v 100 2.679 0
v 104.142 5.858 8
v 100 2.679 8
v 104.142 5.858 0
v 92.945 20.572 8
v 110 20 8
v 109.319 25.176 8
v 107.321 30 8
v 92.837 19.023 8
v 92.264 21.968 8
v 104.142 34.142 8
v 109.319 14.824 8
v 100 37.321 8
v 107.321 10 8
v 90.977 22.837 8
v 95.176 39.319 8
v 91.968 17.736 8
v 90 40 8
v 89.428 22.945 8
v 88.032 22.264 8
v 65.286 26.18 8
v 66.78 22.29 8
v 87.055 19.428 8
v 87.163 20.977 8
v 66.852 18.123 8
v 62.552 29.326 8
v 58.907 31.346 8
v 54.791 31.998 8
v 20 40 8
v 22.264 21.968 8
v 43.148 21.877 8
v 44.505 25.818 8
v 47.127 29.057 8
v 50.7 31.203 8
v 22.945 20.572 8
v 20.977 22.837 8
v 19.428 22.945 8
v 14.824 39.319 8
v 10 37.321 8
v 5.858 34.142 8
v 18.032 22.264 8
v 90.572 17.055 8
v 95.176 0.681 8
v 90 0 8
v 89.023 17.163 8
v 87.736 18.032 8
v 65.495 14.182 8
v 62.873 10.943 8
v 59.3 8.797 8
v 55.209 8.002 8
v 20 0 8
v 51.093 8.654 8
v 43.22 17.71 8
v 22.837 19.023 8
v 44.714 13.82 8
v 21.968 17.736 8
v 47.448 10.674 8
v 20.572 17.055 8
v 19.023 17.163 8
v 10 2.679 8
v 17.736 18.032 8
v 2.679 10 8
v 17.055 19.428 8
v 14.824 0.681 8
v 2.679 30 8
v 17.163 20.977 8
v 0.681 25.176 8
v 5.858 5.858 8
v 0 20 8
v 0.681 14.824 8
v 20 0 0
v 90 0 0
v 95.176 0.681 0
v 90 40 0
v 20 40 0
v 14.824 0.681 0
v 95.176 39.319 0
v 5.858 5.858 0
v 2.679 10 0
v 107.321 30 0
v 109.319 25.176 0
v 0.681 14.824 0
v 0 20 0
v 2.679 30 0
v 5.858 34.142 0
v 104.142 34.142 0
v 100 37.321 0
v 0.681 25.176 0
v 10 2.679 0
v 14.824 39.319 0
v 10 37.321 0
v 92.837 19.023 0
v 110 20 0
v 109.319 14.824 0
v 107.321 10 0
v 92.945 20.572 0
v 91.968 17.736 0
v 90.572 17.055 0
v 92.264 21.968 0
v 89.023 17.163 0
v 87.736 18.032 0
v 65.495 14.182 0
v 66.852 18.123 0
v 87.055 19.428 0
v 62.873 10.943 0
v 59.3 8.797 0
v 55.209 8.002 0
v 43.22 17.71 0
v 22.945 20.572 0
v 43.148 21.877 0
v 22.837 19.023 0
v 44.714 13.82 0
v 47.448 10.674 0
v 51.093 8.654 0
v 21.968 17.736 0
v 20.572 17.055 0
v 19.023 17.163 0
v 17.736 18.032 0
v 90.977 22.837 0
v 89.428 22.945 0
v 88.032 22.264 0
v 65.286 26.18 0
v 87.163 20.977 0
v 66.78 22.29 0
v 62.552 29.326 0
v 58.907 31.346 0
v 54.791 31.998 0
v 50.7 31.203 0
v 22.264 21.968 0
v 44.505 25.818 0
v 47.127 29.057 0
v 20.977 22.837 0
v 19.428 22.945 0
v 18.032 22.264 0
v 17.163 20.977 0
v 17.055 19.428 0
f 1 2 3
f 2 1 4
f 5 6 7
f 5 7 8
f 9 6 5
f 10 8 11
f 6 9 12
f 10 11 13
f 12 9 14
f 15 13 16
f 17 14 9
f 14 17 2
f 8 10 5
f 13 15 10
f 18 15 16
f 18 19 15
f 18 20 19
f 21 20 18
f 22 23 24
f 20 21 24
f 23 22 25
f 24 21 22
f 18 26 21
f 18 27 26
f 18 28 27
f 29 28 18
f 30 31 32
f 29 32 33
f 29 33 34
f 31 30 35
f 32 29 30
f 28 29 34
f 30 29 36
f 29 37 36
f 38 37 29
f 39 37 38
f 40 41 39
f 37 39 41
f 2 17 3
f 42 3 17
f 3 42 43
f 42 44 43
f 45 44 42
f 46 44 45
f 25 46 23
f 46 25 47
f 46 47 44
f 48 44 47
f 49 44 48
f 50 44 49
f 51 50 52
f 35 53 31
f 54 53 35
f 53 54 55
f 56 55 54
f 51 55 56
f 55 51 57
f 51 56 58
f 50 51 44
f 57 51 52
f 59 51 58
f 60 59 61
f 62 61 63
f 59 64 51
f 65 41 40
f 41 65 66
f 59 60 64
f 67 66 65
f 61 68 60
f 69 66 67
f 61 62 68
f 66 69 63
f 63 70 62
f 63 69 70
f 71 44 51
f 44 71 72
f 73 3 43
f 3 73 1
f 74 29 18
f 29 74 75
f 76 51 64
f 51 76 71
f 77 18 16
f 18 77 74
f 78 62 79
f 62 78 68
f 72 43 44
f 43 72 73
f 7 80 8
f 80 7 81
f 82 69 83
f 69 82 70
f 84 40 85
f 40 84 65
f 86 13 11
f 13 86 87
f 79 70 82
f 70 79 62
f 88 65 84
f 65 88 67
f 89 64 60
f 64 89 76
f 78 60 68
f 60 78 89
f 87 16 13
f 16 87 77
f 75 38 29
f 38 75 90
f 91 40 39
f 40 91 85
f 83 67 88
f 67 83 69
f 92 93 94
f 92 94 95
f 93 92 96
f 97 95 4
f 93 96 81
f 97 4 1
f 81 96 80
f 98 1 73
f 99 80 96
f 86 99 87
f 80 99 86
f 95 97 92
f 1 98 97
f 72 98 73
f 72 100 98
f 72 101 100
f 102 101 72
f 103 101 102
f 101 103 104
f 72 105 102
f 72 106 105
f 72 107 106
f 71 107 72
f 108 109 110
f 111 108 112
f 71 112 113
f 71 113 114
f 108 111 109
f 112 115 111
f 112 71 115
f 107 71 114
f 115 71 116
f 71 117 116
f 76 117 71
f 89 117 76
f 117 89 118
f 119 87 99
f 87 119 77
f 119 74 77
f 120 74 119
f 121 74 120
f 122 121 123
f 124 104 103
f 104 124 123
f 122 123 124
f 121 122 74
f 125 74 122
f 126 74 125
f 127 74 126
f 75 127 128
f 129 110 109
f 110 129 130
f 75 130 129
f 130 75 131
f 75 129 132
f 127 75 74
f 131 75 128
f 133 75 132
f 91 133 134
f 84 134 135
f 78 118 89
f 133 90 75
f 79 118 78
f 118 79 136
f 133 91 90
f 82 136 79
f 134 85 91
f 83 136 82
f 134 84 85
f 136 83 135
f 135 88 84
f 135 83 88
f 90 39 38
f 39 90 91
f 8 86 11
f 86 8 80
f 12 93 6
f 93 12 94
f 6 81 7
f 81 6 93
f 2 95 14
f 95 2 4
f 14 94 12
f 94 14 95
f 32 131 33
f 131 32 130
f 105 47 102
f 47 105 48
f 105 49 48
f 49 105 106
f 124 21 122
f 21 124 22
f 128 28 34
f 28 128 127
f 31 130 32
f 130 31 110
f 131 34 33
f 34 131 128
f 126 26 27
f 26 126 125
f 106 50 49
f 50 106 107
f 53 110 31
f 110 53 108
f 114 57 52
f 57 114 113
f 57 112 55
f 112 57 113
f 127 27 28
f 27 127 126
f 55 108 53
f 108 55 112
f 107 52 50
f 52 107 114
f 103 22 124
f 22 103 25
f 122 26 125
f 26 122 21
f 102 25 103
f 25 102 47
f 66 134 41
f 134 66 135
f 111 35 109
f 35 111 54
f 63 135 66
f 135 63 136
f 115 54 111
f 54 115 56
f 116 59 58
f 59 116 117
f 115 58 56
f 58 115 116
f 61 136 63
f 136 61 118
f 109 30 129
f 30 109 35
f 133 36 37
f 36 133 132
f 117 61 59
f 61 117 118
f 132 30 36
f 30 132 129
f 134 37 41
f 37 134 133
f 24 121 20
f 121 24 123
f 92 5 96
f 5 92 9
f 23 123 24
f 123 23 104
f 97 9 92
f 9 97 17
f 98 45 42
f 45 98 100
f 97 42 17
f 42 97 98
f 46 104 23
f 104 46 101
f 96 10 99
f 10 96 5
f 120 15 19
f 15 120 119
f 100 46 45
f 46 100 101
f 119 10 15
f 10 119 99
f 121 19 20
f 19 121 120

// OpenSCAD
$fn = 32;

// ----------------------------------------------------------------------
// Spacer plate: obround span 70, caps R20
// ----------------------------------------------------------------------

// --- parameters (mm) ---
bore_r = 12;              // centre bore radius
bolt_r = 3;               // bolt hole radius
plate_t = 8;              // plate thickness, Z (extrusion height)
span = 70;                // obround span
cap_r = 20;               // cap radius

profile = [[20, 40], [14.824, 39.319], [10, 37.321], [5.858, 34.142], [2.679, 30], [0.681, 25.176], [0, 20], [0.681, 14.824], [2.679, 10], [5.858, 5.858], [10, 2.679], [14.824, 0.681], [20, 0], [90, 0], [95.176, 0.681], [100, 2.679], [104.142, 5.858], [107.321, 10], [109.319, 14.824], [110, 20], [109.319, 25.176], [107.321, 30], [104.142, 34.142], [100, 37.321], [95.176, 39.319], [90, 40]];  // primary outline, 26 points, counter clockwise
void_1 = [[66.78, 22.29], [65.286, 26.18], [62.552, 29.326], [58.907, 31.346], [54.791, 31.998], [50.7, 31.203], [47.127, 29.057], [44.505, 25.818], [43.148, 21.877], [43.22, 17.71], [44.714, 13.82], [47.448, 10.674], [51.093, 8.654], [55.209, 8.002], [59.3, 8.797], [62.873, 10.943], [65.495, 14.182], [66.852, 18.123]];  // centre bore, 18 points
void_2 = [[22.945, 20.572], [22.264, 21.968], [20.977, 22.837], [19.428, 22.945], [18.032, 22.264], [17.163, 20.977], [17.055, 19.428], [17.736, 18.032], [19.023, 17.163], [20.572, 17.055], [21.968, 17.736], [22.837, 19.023]];  // end hole, 12 points
void_3 = [[92.945, 20.572], [92.264, 21.968], [90.977, 22.837], [89.428, 22.945], [88.032, 22.264], [87.163, 20.977], [87.055, 19.428], [87.736, 18.032], [89.023, 17.163], [90.572, 17.055], [91.968, 17.736], [92.837, 19.023]];  // end hole, 12 points

// --- the one profile operation ---
difference() {
  linear_extrude(height = plate_t) polygon(points = profile);
  translate([0, 0, -1])
    linear_extrude(height = plate_t + 2) polygon(points = void_1);
  translate([0, 0, -1])
    linear_extrude(height = plate_t + 2) polygon(points = void_2);
  translate([0, 0, -1])
    linear_extrude(height = plate_t + 2) polygon(points = void_3);
}
